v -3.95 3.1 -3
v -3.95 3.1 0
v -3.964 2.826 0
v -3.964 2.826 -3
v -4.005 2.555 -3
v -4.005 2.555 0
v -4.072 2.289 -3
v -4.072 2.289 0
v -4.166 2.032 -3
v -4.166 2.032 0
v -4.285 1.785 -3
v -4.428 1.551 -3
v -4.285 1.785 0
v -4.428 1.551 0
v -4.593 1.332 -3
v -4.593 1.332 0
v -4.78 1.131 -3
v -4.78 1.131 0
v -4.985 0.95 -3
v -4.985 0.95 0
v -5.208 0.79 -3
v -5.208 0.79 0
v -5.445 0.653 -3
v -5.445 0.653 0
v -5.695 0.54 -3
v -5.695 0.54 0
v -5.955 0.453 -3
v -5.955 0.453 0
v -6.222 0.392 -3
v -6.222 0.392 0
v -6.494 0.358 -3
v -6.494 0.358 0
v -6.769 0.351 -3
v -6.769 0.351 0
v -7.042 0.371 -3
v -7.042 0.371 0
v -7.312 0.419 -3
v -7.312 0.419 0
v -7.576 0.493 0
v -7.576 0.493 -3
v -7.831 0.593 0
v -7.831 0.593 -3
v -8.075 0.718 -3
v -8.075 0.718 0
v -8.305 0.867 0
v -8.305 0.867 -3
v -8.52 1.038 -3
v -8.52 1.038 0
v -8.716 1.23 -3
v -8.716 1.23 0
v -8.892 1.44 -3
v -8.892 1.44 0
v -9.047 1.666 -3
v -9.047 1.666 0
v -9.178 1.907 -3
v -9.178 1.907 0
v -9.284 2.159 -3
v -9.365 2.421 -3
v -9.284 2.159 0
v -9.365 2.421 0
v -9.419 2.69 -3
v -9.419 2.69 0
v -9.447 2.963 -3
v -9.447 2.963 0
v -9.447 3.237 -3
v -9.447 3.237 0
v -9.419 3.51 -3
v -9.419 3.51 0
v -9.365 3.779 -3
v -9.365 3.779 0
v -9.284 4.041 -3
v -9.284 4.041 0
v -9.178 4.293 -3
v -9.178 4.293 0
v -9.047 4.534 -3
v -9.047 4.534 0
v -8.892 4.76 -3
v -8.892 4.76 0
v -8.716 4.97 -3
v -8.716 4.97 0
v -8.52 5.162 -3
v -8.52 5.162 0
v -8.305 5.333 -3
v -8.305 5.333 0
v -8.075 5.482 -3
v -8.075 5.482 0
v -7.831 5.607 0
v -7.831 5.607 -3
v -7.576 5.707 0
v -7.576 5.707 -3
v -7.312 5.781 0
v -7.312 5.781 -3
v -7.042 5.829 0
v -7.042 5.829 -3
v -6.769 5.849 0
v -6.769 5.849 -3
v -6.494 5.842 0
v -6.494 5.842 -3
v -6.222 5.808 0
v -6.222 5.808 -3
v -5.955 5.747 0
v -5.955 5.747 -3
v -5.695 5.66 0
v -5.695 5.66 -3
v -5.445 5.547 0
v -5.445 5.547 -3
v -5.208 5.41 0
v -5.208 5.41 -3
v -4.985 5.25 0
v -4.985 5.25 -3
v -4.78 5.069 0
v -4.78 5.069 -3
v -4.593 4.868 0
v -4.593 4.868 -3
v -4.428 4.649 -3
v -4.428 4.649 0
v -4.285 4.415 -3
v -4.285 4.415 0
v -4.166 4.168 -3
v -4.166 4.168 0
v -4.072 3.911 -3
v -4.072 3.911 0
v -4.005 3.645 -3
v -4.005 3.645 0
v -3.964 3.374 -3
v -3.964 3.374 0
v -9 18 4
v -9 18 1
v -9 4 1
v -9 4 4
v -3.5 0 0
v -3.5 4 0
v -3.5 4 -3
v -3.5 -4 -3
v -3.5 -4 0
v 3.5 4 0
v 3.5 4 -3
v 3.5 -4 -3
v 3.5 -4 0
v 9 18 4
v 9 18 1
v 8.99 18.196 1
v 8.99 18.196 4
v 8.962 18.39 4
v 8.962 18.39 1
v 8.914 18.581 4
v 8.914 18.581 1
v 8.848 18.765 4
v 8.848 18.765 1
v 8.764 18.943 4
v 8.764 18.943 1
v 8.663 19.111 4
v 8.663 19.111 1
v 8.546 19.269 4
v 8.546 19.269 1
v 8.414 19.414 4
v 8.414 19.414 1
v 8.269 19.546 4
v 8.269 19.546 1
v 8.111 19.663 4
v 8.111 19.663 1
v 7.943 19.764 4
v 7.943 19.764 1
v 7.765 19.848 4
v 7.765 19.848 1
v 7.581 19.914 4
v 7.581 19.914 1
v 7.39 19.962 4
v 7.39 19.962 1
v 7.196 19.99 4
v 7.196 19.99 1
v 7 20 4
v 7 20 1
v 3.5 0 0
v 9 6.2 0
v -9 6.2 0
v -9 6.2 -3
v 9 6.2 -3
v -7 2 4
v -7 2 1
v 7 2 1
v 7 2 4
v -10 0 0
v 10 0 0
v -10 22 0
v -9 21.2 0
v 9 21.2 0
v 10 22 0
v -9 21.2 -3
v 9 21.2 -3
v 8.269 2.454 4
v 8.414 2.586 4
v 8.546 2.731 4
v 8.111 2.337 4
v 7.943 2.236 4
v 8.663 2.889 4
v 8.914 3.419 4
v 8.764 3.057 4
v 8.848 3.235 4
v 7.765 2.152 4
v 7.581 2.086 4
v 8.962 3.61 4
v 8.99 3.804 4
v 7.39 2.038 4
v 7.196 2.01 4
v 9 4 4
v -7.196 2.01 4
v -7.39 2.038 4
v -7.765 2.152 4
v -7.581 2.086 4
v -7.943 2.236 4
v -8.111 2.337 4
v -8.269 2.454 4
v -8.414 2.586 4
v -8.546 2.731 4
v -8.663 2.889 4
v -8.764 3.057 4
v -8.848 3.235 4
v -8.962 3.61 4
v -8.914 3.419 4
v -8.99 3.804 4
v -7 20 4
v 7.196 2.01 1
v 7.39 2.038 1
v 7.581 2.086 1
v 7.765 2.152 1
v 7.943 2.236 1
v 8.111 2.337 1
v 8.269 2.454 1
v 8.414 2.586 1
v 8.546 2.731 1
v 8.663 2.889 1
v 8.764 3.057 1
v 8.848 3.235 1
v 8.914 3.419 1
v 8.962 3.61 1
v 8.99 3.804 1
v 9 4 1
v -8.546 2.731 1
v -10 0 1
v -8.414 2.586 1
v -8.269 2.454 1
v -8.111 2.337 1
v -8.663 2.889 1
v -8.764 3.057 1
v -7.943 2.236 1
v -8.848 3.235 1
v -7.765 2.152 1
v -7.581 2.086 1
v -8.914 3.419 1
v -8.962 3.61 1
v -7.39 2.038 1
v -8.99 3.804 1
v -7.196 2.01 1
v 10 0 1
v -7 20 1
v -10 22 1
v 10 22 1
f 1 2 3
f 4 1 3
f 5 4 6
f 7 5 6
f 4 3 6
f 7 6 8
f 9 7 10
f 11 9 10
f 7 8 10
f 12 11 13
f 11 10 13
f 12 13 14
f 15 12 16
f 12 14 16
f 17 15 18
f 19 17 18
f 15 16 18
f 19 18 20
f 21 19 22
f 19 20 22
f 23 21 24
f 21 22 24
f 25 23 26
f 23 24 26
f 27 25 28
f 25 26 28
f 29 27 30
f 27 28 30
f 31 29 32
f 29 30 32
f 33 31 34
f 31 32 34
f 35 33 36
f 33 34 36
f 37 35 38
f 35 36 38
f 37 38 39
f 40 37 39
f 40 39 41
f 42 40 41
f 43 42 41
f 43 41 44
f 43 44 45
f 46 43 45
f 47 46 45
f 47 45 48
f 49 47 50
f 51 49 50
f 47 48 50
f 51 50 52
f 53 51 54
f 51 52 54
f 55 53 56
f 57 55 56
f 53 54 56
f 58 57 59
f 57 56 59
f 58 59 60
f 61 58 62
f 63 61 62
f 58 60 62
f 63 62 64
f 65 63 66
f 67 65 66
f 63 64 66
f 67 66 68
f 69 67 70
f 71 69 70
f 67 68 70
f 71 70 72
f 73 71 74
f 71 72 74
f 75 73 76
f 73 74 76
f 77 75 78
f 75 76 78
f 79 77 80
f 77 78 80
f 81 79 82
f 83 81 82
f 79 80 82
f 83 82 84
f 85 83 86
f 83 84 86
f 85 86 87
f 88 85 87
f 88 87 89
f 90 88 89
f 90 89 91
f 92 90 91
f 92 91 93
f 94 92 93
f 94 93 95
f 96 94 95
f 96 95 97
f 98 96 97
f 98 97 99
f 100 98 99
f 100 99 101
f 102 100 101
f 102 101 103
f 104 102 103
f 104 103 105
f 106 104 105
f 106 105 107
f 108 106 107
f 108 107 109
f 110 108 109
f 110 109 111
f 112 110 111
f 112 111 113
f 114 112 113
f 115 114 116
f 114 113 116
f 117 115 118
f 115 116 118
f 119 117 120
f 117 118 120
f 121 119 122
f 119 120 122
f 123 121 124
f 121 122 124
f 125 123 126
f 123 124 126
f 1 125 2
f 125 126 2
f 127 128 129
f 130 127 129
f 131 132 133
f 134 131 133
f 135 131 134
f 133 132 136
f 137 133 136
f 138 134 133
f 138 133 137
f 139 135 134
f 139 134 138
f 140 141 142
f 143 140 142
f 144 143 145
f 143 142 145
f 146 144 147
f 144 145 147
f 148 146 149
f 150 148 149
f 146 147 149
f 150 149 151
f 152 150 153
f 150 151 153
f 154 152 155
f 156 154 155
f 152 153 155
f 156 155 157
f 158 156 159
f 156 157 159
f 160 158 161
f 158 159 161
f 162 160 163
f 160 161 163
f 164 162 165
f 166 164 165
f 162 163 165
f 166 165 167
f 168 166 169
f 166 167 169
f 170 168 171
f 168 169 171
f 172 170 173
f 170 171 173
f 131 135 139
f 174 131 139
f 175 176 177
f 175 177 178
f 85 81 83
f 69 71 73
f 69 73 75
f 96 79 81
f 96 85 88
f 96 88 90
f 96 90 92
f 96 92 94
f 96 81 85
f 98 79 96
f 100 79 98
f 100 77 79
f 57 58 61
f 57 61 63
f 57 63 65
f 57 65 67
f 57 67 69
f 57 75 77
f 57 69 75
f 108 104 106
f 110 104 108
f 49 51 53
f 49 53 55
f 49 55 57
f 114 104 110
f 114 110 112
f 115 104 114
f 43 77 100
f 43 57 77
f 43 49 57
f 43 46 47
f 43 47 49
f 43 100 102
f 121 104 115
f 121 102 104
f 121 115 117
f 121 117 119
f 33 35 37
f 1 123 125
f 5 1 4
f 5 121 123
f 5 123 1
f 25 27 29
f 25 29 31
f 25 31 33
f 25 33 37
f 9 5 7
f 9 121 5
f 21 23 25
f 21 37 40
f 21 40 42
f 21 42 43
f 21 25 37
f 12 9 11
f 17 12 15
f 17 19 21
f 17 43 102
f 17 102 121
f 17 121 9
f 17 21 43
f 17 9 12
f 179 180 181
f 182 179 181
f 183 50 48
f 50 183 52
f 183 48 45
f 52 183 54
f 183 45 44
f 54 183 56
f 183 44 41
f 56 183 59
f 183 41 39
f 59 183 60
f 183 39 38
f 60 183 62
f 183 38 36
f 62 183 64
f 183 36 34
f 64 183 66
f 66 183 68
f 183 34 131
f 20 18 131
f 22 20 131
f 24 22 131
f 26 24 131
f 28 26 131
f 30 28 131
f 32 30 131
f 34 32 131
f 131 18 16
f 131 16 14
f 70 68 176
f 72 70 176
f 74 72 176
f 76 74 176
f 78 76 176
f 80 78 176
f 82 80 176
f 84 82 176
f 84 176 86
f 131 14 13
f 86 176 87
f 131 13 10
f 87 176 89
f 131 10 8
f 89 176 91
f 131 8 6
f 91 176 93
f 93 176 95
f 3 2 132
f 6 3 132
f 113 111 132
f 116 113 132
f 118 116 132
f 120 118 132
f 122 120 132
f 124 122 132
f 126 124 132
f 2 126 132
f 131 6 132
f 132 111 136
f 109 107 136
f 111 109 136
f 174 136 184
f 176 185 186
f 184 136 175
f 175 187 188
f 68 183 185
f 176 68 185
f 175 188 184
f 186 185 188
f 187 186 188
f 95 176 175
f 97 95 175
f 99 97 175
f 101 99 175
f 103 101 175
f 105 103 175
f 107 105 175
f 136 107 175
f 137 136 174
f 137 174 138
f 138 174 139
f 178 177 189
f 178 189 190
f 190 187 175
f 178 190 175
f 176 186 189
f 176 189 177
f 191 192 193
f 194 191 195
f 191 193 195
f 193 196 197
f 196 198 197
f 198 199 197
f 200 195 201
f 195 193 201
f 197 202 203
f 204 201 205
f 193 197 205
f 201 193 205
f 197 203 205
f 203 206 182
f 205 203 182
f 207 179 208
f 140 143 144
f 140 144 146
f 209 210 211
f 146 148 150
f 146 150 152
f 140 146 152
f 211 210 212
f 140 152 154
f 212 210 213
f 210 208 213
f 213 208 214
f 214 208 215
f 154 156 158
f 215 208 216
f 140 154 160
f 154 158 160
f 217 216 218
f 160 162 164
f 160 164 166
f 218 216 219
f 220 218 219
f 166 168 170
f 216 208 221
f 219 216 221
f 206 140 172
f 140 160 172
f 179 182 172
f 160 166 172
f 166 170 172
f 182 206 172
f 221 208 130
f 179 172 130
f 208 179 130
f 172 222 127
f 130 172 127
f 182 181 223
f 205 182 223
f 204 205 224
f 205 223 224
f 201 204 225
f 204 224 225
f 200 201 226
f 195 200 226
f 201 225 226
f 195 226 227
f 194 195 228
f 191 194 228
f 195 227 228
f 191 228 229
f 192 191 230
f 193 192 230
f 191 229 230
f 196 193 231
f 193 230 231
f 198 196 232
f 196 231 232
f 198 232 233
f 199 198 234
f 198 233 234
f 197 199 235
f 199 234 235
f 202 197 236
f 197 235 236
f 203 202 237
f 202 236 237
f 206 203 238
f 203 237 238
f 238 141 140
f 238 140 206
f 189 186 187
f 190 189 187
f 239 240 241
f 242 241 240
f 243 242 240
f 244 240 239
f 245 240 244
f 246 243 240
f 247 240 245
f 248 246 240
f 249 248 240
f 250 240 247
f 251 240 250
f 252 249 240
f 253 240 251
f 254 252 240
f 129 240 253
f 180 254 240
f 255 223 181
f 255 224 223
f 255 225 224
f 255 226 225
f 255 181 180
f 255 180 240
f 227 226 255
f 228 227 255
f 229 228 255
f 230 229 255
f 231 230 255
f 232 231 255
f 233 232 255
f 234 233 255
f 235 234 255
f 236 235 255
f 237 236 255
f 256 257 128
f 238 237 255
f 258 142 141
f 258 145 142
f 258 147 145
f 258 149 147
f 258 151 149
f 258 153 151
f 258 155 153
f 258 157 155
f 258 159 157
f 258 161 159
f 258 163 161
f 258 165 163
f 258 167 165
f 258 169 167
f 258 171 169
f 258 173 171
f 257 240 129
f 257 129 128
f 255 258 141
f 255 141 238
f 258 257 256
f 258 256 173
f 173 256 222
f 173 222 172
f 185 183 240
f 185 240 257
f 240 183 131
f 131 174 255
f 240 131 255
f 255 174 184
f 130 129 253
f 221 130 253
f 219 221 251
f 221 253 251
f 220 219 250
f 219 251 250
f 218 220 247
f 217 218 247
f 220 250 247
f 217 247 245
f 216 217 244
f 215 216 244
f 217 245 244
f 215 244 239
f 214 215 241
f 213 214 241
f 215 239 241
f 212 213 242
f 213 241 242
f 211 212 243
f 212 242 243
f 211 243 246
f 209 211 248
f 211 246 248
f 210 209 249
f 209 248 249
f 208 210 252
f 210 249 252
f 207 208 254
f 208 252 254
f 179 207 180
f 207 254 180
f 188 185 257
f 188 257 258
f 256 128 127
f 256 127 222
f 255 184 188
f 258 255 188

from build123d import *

# Parameters (mm, degrees)
SKETCH_W      = 20
SKETCH_H      = 22
PAD_DEPTH     = 1
PAD001_DEPTH  = 3
SKETCH002_R   = 2.75
SKETCH002_W   = 18
SKETCH002_H   = 15
SKETCH002_W_2 = 7
SKETCH002_H_2 = 8
PAD002_DEPTH  = 3


with BuildPart() as part:
    # Sketch → Pad (new body)
    with BuildSketch(Plane.XY):
        with Locations((0, 11)):
            Rectangle(SKETCH_W, SKETCH_H)
    extrude(amount=PAD_DEPTH)

    # Sketch001 (on Face6 of Pad) → Pad001 (join)
    with BuildSketch(Plane.XY.offset(1)):
        with BuildLine():
            Line((-7, 20), (7, 20))
            ThreePointArc((9, 18), (8.414214, 19.414214), (7, 20))
            Line((9, 18), (9, 4))
            ThreePointArc((7, 2), (8.414214, 2.585786), (9, 4))
            Line((-7, 2), (7, 2))
            ThreePointArc((-9, 4), (-8.414214, 2.585786), (-7, 2))
            Line((-9, 18), (-9, 4))
            Line((-9, 18), (-7, 20))
        make_face()
    extrude(amount=PAD001_DEPTH)

    # Sketch002 (on Face4 of Pad001) → Pad002 (join)
    with BuildSketch(Plane(origin=(0, 0, 0), x_dir=(1, 0, 0), z_dir=(0, 0, -1))):
        with Locations((-6.7, -3.1)):
            Circle(SKETCH002_R)
        with Locations((0, -13.7)):
            Rectangle(SKETCH002_W, SKETCH002_H)
        Rectangle(SKETCH002_W_2, SKETCH002_H_2)
    extrude(amount=PAD002_DEPTH)


solid = part.part
